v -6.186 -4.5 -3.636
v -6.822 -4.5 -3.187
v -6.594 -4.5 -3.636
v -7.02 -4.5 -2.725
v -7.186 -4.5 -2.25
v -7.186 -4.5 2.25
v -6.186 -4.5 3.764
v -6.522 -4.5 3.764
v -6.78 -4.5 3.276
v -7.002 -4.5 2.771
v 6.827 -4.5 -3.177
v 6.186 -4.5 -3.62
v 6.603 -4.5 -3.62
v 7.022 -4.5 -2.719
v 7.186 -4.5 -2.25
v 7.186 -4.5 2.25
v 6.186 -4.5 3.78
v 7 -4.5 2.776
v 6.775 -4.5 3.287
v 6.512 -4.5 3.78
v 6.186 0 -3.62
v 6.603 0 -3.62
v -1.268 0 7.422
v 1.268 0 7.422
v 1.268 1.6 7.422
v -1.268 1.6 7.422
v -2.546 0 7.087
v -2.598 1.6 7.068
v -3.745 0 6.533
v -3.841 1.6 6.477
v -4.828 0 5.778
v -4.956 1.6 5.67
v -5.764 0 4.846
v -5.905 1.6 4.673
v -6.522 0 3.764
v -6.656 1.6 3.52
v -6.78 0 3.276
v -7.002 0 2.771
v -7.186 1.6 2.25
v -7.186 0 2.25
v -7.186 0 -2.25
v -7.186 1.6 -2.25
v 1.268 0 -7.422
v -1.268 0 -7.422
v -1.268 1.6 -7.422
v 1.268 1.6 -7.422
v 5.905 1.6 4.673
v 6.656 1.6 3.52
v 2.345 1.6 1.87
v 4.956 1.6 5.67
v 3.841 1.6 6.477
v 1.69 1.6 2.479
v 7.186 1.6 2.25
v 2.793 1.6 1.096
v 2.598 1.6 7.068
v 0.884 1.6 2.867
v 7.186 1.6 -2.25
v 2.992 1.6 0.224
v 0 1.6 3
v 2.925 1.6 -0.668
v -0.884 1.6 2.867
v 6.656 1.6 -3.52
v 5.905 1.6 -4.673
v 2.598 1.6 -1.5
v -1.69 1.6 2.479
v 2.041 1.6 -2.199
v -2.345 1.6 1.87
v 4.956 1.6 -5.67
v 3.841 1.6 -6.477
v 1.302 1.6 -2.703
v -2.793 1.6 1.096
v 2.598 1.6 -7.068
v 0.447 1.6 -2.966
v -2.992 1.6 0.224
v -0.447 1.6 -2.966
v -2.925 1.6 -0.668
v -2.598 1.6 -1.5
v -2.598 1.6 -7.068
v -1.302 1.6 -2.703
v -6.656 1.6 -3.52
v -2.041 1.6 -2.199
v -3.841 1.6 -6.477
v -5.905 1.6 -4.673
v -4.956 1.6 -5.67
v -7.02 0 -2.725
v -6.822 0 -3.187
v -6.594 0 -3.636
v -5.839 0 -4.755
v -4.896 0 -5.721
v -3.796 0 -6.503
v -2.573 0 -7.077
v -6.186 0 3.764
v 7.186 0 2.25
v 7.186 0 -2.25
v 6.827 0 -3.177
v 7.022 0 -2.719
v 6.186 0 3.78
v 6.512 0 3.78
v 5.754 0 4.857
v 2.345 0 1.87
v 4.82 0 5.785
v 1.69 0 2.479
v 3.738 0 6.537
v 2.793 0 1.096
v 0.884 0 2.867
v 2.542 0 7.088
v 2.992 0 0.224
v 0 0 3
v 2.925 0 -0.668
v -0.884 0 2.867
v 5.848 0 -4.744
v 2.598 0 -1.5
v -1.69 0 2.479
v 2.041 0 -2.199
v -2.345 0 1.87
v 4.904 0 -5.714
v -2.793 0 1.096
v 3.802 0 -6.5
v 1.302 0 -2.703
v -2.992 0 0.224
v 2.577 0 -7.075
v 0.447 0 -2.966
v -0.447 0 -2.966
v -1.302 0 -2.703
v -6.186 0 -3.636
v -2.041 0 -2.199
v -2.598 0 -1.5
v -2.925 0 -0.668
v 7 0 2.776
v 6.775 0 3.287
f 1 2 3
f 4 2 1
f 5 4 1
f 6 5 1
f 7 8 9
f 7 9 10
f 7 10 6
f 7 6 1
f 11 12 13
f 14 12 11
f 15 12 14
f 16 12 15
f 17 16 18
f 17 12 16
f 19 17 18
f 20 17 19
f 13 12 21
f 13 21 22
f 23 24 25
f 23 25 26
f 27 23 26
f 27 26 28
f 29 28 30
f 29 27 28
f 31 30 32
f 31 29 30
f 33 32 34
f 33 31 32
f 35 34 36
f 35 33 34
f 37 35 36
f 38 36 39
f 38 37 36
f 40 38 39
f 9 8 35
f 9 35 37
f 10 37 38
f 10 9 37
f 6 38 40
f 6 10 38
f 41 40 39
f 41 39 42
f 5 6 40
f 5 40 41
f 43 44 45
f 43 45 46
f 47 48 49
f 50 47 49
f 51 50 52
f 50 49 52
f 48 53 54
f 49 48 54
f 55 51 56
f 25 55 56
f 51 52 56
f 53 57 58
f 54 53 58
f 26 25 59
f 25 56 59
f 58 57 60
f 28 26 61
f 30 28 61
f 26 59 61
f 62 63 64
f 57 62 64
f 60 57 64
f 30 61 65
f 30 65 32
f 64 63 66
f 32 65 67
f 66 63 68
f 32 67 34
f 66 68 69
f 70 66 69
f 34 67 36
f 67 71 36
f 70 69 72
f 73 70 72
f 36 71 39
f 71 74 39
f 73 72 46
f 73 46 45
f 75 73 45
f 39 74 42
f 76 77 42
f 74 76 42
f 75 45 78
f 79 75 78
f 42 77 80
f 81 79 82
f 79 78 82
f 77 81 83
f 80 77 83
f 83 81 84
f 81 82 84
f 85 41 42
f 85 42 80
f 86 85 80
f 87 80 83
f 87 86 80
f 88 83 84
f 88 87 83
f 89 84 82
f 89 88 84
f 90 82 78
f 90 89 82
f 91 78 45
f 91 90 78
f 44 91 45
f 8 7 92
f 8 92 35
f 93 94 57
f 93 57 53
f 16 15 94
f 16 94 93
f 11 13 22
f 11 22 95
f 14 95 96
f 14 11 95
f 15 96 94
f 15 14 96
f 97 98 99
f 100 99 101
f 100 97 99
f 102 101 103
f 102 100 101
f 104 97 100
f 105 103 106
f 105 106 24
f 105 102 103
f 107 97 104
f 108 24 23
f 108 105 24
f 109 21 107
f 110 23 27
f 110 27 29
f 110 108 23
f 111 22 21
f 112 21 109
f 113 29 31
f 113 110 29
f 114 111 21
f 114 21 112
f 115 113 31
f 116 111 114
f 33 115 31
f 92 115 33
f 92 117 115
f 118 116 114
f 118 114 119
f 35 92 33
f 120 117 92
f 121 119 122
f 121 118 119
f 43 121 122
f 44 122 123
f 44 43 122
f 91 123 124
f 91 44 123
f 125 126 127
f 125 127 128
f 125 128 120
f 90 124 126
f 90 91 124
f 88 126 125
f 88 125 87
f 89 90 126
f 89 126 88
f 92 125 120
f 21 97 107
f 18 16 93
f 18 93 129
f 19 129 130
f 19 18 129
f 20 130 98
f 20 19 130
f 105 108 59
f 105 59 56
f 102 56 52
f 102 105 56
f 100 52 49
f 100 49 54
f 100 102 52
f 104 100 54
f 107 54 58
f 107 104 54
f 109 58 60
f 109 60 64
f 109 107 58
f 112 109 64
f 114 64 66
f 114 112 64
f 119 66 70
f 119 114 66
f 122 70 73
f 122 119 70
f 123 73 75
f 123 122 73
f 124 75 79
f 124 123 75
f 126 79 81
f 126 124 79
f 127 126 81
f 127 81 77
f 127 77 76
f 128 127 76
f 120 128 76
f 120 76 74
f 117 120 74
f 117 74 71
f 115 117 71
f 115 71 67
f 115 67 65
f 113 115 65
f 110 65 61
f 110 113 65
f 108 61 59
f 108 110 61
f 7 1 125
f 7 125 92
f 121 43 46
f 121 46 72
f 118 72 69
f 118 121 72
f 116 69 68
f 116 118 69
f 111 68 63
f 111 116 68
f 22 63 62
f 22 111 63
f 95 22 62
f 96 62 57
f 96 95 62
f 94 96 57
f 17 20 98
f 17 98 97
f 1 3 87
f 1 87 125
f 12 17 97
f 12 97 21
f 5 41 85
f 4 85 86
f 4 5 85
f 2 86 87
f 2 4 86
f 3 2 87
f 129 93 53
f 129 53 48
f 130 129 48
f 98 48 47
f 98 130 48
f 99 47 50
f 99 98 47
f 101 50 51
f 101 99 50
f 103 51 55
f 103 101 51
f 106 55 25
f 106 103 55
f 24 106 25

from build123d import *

# Parameters (mm, degrees)
SKETCH1_R           = 3
BOSS_EXTRUDE1_DEPTH = 1.6
BOSS_EXTRUDE3_START = 4.5
BOSS_EXTRUDE3_DEPTH = 4.5


with BuildPart() as part:
    # Sketch1 → Boss-Extrude1 (new body)
    with BuildSketch(Plane(origin=(0, 0, 0), x_dir=(1, 0, 0), z_dir=(0, 1, 0))):
        with BuildLine():
            Line((1.268248439, -7.422428571), (-1.268248439, -7.422428571))
            ThreePointArc((-1.268248439, -7.422428571), (-4.955504601, -5.669556786), (-7.185986362, -2.25))
            Line((-7.185986362, -2.25), (-7.185986362, 2.25))
            ThreePointArc((-7.185986362, 2.25), (-4.955504601, 5.669556786), (-1.268248439, 7.422428571))
            Line((-1.268248439, 7.422428571), (1.268248439, 7.422428571))
            ThreePointArc((1.268248439, 7.422428571), (4.955504601, 5.669556786), (7.185986362, 2.25))
            Line((7.185986362, 2.25), (7.185986362, -2.25))
            ThreePointArc((7.185986362, -2.25), (4.955504601, -5.669556786), (1.268248439, -7.422428571))
        make_face()
        with Locations(Location((0, 0, 0), (0, 0, 270))):
            Circle(SKETCH1_R, mode=Mode.SUBTRACT)
    extrude(amount=BOSS_EXTRUDE1_DEPTH)

    # Sketch2 → Boss-Extrude3 (add)
    with BuildSketch(Plane.XZ.offset(BOSS_EXTRUDE3_START)):
        with BuildLine():
            ThreePointArc((-7.185986362, -2.25), (-6.924787857, -2.957737841), (-6.594083964, -3.635788316))
            Line((-6.594083964, -3.635788316), (-6.185986362, -3.635788316))
            Line((-6.185986362, -3.635788316), (-6.185986362, 3.764211684))
            Line((-6.185986362, 3.764211684), (-6.521626362, 3.764211684))
            ThreePointArc((-6.521626362, 3.764211684), (-6.895496422, 3.025397345), (-7.185986362, 2.25))
            Line((-7.185986362, 2.25), (-7.185986362, -2.25))
        make_face()
        with BuildLine():
            Line((6.185986362, -3.620011298), (6.602758378, -3.620011298))
            ThreePointArc((6.602758378, -3.620011298), (6.928318925, -2.949457048), (7.185986362, -2.25))
            Line((7.185986362, -2.25), (7.185986362, 2.25))
            ThreePointArc((7.185986362, 2.25), (6.891829312, 3.033741706), (6.512494562, 3.779988702))
            Line((6.512494562, 3.779988702), (6.185986362, 3.779988702))
            Line((6.185986362, 3.779988702), (6.185986362, -3.620011298))
        make_face()
    extrude(amount=-BOSS_EXTRUDE3_DEPTH)


solid = part.part
